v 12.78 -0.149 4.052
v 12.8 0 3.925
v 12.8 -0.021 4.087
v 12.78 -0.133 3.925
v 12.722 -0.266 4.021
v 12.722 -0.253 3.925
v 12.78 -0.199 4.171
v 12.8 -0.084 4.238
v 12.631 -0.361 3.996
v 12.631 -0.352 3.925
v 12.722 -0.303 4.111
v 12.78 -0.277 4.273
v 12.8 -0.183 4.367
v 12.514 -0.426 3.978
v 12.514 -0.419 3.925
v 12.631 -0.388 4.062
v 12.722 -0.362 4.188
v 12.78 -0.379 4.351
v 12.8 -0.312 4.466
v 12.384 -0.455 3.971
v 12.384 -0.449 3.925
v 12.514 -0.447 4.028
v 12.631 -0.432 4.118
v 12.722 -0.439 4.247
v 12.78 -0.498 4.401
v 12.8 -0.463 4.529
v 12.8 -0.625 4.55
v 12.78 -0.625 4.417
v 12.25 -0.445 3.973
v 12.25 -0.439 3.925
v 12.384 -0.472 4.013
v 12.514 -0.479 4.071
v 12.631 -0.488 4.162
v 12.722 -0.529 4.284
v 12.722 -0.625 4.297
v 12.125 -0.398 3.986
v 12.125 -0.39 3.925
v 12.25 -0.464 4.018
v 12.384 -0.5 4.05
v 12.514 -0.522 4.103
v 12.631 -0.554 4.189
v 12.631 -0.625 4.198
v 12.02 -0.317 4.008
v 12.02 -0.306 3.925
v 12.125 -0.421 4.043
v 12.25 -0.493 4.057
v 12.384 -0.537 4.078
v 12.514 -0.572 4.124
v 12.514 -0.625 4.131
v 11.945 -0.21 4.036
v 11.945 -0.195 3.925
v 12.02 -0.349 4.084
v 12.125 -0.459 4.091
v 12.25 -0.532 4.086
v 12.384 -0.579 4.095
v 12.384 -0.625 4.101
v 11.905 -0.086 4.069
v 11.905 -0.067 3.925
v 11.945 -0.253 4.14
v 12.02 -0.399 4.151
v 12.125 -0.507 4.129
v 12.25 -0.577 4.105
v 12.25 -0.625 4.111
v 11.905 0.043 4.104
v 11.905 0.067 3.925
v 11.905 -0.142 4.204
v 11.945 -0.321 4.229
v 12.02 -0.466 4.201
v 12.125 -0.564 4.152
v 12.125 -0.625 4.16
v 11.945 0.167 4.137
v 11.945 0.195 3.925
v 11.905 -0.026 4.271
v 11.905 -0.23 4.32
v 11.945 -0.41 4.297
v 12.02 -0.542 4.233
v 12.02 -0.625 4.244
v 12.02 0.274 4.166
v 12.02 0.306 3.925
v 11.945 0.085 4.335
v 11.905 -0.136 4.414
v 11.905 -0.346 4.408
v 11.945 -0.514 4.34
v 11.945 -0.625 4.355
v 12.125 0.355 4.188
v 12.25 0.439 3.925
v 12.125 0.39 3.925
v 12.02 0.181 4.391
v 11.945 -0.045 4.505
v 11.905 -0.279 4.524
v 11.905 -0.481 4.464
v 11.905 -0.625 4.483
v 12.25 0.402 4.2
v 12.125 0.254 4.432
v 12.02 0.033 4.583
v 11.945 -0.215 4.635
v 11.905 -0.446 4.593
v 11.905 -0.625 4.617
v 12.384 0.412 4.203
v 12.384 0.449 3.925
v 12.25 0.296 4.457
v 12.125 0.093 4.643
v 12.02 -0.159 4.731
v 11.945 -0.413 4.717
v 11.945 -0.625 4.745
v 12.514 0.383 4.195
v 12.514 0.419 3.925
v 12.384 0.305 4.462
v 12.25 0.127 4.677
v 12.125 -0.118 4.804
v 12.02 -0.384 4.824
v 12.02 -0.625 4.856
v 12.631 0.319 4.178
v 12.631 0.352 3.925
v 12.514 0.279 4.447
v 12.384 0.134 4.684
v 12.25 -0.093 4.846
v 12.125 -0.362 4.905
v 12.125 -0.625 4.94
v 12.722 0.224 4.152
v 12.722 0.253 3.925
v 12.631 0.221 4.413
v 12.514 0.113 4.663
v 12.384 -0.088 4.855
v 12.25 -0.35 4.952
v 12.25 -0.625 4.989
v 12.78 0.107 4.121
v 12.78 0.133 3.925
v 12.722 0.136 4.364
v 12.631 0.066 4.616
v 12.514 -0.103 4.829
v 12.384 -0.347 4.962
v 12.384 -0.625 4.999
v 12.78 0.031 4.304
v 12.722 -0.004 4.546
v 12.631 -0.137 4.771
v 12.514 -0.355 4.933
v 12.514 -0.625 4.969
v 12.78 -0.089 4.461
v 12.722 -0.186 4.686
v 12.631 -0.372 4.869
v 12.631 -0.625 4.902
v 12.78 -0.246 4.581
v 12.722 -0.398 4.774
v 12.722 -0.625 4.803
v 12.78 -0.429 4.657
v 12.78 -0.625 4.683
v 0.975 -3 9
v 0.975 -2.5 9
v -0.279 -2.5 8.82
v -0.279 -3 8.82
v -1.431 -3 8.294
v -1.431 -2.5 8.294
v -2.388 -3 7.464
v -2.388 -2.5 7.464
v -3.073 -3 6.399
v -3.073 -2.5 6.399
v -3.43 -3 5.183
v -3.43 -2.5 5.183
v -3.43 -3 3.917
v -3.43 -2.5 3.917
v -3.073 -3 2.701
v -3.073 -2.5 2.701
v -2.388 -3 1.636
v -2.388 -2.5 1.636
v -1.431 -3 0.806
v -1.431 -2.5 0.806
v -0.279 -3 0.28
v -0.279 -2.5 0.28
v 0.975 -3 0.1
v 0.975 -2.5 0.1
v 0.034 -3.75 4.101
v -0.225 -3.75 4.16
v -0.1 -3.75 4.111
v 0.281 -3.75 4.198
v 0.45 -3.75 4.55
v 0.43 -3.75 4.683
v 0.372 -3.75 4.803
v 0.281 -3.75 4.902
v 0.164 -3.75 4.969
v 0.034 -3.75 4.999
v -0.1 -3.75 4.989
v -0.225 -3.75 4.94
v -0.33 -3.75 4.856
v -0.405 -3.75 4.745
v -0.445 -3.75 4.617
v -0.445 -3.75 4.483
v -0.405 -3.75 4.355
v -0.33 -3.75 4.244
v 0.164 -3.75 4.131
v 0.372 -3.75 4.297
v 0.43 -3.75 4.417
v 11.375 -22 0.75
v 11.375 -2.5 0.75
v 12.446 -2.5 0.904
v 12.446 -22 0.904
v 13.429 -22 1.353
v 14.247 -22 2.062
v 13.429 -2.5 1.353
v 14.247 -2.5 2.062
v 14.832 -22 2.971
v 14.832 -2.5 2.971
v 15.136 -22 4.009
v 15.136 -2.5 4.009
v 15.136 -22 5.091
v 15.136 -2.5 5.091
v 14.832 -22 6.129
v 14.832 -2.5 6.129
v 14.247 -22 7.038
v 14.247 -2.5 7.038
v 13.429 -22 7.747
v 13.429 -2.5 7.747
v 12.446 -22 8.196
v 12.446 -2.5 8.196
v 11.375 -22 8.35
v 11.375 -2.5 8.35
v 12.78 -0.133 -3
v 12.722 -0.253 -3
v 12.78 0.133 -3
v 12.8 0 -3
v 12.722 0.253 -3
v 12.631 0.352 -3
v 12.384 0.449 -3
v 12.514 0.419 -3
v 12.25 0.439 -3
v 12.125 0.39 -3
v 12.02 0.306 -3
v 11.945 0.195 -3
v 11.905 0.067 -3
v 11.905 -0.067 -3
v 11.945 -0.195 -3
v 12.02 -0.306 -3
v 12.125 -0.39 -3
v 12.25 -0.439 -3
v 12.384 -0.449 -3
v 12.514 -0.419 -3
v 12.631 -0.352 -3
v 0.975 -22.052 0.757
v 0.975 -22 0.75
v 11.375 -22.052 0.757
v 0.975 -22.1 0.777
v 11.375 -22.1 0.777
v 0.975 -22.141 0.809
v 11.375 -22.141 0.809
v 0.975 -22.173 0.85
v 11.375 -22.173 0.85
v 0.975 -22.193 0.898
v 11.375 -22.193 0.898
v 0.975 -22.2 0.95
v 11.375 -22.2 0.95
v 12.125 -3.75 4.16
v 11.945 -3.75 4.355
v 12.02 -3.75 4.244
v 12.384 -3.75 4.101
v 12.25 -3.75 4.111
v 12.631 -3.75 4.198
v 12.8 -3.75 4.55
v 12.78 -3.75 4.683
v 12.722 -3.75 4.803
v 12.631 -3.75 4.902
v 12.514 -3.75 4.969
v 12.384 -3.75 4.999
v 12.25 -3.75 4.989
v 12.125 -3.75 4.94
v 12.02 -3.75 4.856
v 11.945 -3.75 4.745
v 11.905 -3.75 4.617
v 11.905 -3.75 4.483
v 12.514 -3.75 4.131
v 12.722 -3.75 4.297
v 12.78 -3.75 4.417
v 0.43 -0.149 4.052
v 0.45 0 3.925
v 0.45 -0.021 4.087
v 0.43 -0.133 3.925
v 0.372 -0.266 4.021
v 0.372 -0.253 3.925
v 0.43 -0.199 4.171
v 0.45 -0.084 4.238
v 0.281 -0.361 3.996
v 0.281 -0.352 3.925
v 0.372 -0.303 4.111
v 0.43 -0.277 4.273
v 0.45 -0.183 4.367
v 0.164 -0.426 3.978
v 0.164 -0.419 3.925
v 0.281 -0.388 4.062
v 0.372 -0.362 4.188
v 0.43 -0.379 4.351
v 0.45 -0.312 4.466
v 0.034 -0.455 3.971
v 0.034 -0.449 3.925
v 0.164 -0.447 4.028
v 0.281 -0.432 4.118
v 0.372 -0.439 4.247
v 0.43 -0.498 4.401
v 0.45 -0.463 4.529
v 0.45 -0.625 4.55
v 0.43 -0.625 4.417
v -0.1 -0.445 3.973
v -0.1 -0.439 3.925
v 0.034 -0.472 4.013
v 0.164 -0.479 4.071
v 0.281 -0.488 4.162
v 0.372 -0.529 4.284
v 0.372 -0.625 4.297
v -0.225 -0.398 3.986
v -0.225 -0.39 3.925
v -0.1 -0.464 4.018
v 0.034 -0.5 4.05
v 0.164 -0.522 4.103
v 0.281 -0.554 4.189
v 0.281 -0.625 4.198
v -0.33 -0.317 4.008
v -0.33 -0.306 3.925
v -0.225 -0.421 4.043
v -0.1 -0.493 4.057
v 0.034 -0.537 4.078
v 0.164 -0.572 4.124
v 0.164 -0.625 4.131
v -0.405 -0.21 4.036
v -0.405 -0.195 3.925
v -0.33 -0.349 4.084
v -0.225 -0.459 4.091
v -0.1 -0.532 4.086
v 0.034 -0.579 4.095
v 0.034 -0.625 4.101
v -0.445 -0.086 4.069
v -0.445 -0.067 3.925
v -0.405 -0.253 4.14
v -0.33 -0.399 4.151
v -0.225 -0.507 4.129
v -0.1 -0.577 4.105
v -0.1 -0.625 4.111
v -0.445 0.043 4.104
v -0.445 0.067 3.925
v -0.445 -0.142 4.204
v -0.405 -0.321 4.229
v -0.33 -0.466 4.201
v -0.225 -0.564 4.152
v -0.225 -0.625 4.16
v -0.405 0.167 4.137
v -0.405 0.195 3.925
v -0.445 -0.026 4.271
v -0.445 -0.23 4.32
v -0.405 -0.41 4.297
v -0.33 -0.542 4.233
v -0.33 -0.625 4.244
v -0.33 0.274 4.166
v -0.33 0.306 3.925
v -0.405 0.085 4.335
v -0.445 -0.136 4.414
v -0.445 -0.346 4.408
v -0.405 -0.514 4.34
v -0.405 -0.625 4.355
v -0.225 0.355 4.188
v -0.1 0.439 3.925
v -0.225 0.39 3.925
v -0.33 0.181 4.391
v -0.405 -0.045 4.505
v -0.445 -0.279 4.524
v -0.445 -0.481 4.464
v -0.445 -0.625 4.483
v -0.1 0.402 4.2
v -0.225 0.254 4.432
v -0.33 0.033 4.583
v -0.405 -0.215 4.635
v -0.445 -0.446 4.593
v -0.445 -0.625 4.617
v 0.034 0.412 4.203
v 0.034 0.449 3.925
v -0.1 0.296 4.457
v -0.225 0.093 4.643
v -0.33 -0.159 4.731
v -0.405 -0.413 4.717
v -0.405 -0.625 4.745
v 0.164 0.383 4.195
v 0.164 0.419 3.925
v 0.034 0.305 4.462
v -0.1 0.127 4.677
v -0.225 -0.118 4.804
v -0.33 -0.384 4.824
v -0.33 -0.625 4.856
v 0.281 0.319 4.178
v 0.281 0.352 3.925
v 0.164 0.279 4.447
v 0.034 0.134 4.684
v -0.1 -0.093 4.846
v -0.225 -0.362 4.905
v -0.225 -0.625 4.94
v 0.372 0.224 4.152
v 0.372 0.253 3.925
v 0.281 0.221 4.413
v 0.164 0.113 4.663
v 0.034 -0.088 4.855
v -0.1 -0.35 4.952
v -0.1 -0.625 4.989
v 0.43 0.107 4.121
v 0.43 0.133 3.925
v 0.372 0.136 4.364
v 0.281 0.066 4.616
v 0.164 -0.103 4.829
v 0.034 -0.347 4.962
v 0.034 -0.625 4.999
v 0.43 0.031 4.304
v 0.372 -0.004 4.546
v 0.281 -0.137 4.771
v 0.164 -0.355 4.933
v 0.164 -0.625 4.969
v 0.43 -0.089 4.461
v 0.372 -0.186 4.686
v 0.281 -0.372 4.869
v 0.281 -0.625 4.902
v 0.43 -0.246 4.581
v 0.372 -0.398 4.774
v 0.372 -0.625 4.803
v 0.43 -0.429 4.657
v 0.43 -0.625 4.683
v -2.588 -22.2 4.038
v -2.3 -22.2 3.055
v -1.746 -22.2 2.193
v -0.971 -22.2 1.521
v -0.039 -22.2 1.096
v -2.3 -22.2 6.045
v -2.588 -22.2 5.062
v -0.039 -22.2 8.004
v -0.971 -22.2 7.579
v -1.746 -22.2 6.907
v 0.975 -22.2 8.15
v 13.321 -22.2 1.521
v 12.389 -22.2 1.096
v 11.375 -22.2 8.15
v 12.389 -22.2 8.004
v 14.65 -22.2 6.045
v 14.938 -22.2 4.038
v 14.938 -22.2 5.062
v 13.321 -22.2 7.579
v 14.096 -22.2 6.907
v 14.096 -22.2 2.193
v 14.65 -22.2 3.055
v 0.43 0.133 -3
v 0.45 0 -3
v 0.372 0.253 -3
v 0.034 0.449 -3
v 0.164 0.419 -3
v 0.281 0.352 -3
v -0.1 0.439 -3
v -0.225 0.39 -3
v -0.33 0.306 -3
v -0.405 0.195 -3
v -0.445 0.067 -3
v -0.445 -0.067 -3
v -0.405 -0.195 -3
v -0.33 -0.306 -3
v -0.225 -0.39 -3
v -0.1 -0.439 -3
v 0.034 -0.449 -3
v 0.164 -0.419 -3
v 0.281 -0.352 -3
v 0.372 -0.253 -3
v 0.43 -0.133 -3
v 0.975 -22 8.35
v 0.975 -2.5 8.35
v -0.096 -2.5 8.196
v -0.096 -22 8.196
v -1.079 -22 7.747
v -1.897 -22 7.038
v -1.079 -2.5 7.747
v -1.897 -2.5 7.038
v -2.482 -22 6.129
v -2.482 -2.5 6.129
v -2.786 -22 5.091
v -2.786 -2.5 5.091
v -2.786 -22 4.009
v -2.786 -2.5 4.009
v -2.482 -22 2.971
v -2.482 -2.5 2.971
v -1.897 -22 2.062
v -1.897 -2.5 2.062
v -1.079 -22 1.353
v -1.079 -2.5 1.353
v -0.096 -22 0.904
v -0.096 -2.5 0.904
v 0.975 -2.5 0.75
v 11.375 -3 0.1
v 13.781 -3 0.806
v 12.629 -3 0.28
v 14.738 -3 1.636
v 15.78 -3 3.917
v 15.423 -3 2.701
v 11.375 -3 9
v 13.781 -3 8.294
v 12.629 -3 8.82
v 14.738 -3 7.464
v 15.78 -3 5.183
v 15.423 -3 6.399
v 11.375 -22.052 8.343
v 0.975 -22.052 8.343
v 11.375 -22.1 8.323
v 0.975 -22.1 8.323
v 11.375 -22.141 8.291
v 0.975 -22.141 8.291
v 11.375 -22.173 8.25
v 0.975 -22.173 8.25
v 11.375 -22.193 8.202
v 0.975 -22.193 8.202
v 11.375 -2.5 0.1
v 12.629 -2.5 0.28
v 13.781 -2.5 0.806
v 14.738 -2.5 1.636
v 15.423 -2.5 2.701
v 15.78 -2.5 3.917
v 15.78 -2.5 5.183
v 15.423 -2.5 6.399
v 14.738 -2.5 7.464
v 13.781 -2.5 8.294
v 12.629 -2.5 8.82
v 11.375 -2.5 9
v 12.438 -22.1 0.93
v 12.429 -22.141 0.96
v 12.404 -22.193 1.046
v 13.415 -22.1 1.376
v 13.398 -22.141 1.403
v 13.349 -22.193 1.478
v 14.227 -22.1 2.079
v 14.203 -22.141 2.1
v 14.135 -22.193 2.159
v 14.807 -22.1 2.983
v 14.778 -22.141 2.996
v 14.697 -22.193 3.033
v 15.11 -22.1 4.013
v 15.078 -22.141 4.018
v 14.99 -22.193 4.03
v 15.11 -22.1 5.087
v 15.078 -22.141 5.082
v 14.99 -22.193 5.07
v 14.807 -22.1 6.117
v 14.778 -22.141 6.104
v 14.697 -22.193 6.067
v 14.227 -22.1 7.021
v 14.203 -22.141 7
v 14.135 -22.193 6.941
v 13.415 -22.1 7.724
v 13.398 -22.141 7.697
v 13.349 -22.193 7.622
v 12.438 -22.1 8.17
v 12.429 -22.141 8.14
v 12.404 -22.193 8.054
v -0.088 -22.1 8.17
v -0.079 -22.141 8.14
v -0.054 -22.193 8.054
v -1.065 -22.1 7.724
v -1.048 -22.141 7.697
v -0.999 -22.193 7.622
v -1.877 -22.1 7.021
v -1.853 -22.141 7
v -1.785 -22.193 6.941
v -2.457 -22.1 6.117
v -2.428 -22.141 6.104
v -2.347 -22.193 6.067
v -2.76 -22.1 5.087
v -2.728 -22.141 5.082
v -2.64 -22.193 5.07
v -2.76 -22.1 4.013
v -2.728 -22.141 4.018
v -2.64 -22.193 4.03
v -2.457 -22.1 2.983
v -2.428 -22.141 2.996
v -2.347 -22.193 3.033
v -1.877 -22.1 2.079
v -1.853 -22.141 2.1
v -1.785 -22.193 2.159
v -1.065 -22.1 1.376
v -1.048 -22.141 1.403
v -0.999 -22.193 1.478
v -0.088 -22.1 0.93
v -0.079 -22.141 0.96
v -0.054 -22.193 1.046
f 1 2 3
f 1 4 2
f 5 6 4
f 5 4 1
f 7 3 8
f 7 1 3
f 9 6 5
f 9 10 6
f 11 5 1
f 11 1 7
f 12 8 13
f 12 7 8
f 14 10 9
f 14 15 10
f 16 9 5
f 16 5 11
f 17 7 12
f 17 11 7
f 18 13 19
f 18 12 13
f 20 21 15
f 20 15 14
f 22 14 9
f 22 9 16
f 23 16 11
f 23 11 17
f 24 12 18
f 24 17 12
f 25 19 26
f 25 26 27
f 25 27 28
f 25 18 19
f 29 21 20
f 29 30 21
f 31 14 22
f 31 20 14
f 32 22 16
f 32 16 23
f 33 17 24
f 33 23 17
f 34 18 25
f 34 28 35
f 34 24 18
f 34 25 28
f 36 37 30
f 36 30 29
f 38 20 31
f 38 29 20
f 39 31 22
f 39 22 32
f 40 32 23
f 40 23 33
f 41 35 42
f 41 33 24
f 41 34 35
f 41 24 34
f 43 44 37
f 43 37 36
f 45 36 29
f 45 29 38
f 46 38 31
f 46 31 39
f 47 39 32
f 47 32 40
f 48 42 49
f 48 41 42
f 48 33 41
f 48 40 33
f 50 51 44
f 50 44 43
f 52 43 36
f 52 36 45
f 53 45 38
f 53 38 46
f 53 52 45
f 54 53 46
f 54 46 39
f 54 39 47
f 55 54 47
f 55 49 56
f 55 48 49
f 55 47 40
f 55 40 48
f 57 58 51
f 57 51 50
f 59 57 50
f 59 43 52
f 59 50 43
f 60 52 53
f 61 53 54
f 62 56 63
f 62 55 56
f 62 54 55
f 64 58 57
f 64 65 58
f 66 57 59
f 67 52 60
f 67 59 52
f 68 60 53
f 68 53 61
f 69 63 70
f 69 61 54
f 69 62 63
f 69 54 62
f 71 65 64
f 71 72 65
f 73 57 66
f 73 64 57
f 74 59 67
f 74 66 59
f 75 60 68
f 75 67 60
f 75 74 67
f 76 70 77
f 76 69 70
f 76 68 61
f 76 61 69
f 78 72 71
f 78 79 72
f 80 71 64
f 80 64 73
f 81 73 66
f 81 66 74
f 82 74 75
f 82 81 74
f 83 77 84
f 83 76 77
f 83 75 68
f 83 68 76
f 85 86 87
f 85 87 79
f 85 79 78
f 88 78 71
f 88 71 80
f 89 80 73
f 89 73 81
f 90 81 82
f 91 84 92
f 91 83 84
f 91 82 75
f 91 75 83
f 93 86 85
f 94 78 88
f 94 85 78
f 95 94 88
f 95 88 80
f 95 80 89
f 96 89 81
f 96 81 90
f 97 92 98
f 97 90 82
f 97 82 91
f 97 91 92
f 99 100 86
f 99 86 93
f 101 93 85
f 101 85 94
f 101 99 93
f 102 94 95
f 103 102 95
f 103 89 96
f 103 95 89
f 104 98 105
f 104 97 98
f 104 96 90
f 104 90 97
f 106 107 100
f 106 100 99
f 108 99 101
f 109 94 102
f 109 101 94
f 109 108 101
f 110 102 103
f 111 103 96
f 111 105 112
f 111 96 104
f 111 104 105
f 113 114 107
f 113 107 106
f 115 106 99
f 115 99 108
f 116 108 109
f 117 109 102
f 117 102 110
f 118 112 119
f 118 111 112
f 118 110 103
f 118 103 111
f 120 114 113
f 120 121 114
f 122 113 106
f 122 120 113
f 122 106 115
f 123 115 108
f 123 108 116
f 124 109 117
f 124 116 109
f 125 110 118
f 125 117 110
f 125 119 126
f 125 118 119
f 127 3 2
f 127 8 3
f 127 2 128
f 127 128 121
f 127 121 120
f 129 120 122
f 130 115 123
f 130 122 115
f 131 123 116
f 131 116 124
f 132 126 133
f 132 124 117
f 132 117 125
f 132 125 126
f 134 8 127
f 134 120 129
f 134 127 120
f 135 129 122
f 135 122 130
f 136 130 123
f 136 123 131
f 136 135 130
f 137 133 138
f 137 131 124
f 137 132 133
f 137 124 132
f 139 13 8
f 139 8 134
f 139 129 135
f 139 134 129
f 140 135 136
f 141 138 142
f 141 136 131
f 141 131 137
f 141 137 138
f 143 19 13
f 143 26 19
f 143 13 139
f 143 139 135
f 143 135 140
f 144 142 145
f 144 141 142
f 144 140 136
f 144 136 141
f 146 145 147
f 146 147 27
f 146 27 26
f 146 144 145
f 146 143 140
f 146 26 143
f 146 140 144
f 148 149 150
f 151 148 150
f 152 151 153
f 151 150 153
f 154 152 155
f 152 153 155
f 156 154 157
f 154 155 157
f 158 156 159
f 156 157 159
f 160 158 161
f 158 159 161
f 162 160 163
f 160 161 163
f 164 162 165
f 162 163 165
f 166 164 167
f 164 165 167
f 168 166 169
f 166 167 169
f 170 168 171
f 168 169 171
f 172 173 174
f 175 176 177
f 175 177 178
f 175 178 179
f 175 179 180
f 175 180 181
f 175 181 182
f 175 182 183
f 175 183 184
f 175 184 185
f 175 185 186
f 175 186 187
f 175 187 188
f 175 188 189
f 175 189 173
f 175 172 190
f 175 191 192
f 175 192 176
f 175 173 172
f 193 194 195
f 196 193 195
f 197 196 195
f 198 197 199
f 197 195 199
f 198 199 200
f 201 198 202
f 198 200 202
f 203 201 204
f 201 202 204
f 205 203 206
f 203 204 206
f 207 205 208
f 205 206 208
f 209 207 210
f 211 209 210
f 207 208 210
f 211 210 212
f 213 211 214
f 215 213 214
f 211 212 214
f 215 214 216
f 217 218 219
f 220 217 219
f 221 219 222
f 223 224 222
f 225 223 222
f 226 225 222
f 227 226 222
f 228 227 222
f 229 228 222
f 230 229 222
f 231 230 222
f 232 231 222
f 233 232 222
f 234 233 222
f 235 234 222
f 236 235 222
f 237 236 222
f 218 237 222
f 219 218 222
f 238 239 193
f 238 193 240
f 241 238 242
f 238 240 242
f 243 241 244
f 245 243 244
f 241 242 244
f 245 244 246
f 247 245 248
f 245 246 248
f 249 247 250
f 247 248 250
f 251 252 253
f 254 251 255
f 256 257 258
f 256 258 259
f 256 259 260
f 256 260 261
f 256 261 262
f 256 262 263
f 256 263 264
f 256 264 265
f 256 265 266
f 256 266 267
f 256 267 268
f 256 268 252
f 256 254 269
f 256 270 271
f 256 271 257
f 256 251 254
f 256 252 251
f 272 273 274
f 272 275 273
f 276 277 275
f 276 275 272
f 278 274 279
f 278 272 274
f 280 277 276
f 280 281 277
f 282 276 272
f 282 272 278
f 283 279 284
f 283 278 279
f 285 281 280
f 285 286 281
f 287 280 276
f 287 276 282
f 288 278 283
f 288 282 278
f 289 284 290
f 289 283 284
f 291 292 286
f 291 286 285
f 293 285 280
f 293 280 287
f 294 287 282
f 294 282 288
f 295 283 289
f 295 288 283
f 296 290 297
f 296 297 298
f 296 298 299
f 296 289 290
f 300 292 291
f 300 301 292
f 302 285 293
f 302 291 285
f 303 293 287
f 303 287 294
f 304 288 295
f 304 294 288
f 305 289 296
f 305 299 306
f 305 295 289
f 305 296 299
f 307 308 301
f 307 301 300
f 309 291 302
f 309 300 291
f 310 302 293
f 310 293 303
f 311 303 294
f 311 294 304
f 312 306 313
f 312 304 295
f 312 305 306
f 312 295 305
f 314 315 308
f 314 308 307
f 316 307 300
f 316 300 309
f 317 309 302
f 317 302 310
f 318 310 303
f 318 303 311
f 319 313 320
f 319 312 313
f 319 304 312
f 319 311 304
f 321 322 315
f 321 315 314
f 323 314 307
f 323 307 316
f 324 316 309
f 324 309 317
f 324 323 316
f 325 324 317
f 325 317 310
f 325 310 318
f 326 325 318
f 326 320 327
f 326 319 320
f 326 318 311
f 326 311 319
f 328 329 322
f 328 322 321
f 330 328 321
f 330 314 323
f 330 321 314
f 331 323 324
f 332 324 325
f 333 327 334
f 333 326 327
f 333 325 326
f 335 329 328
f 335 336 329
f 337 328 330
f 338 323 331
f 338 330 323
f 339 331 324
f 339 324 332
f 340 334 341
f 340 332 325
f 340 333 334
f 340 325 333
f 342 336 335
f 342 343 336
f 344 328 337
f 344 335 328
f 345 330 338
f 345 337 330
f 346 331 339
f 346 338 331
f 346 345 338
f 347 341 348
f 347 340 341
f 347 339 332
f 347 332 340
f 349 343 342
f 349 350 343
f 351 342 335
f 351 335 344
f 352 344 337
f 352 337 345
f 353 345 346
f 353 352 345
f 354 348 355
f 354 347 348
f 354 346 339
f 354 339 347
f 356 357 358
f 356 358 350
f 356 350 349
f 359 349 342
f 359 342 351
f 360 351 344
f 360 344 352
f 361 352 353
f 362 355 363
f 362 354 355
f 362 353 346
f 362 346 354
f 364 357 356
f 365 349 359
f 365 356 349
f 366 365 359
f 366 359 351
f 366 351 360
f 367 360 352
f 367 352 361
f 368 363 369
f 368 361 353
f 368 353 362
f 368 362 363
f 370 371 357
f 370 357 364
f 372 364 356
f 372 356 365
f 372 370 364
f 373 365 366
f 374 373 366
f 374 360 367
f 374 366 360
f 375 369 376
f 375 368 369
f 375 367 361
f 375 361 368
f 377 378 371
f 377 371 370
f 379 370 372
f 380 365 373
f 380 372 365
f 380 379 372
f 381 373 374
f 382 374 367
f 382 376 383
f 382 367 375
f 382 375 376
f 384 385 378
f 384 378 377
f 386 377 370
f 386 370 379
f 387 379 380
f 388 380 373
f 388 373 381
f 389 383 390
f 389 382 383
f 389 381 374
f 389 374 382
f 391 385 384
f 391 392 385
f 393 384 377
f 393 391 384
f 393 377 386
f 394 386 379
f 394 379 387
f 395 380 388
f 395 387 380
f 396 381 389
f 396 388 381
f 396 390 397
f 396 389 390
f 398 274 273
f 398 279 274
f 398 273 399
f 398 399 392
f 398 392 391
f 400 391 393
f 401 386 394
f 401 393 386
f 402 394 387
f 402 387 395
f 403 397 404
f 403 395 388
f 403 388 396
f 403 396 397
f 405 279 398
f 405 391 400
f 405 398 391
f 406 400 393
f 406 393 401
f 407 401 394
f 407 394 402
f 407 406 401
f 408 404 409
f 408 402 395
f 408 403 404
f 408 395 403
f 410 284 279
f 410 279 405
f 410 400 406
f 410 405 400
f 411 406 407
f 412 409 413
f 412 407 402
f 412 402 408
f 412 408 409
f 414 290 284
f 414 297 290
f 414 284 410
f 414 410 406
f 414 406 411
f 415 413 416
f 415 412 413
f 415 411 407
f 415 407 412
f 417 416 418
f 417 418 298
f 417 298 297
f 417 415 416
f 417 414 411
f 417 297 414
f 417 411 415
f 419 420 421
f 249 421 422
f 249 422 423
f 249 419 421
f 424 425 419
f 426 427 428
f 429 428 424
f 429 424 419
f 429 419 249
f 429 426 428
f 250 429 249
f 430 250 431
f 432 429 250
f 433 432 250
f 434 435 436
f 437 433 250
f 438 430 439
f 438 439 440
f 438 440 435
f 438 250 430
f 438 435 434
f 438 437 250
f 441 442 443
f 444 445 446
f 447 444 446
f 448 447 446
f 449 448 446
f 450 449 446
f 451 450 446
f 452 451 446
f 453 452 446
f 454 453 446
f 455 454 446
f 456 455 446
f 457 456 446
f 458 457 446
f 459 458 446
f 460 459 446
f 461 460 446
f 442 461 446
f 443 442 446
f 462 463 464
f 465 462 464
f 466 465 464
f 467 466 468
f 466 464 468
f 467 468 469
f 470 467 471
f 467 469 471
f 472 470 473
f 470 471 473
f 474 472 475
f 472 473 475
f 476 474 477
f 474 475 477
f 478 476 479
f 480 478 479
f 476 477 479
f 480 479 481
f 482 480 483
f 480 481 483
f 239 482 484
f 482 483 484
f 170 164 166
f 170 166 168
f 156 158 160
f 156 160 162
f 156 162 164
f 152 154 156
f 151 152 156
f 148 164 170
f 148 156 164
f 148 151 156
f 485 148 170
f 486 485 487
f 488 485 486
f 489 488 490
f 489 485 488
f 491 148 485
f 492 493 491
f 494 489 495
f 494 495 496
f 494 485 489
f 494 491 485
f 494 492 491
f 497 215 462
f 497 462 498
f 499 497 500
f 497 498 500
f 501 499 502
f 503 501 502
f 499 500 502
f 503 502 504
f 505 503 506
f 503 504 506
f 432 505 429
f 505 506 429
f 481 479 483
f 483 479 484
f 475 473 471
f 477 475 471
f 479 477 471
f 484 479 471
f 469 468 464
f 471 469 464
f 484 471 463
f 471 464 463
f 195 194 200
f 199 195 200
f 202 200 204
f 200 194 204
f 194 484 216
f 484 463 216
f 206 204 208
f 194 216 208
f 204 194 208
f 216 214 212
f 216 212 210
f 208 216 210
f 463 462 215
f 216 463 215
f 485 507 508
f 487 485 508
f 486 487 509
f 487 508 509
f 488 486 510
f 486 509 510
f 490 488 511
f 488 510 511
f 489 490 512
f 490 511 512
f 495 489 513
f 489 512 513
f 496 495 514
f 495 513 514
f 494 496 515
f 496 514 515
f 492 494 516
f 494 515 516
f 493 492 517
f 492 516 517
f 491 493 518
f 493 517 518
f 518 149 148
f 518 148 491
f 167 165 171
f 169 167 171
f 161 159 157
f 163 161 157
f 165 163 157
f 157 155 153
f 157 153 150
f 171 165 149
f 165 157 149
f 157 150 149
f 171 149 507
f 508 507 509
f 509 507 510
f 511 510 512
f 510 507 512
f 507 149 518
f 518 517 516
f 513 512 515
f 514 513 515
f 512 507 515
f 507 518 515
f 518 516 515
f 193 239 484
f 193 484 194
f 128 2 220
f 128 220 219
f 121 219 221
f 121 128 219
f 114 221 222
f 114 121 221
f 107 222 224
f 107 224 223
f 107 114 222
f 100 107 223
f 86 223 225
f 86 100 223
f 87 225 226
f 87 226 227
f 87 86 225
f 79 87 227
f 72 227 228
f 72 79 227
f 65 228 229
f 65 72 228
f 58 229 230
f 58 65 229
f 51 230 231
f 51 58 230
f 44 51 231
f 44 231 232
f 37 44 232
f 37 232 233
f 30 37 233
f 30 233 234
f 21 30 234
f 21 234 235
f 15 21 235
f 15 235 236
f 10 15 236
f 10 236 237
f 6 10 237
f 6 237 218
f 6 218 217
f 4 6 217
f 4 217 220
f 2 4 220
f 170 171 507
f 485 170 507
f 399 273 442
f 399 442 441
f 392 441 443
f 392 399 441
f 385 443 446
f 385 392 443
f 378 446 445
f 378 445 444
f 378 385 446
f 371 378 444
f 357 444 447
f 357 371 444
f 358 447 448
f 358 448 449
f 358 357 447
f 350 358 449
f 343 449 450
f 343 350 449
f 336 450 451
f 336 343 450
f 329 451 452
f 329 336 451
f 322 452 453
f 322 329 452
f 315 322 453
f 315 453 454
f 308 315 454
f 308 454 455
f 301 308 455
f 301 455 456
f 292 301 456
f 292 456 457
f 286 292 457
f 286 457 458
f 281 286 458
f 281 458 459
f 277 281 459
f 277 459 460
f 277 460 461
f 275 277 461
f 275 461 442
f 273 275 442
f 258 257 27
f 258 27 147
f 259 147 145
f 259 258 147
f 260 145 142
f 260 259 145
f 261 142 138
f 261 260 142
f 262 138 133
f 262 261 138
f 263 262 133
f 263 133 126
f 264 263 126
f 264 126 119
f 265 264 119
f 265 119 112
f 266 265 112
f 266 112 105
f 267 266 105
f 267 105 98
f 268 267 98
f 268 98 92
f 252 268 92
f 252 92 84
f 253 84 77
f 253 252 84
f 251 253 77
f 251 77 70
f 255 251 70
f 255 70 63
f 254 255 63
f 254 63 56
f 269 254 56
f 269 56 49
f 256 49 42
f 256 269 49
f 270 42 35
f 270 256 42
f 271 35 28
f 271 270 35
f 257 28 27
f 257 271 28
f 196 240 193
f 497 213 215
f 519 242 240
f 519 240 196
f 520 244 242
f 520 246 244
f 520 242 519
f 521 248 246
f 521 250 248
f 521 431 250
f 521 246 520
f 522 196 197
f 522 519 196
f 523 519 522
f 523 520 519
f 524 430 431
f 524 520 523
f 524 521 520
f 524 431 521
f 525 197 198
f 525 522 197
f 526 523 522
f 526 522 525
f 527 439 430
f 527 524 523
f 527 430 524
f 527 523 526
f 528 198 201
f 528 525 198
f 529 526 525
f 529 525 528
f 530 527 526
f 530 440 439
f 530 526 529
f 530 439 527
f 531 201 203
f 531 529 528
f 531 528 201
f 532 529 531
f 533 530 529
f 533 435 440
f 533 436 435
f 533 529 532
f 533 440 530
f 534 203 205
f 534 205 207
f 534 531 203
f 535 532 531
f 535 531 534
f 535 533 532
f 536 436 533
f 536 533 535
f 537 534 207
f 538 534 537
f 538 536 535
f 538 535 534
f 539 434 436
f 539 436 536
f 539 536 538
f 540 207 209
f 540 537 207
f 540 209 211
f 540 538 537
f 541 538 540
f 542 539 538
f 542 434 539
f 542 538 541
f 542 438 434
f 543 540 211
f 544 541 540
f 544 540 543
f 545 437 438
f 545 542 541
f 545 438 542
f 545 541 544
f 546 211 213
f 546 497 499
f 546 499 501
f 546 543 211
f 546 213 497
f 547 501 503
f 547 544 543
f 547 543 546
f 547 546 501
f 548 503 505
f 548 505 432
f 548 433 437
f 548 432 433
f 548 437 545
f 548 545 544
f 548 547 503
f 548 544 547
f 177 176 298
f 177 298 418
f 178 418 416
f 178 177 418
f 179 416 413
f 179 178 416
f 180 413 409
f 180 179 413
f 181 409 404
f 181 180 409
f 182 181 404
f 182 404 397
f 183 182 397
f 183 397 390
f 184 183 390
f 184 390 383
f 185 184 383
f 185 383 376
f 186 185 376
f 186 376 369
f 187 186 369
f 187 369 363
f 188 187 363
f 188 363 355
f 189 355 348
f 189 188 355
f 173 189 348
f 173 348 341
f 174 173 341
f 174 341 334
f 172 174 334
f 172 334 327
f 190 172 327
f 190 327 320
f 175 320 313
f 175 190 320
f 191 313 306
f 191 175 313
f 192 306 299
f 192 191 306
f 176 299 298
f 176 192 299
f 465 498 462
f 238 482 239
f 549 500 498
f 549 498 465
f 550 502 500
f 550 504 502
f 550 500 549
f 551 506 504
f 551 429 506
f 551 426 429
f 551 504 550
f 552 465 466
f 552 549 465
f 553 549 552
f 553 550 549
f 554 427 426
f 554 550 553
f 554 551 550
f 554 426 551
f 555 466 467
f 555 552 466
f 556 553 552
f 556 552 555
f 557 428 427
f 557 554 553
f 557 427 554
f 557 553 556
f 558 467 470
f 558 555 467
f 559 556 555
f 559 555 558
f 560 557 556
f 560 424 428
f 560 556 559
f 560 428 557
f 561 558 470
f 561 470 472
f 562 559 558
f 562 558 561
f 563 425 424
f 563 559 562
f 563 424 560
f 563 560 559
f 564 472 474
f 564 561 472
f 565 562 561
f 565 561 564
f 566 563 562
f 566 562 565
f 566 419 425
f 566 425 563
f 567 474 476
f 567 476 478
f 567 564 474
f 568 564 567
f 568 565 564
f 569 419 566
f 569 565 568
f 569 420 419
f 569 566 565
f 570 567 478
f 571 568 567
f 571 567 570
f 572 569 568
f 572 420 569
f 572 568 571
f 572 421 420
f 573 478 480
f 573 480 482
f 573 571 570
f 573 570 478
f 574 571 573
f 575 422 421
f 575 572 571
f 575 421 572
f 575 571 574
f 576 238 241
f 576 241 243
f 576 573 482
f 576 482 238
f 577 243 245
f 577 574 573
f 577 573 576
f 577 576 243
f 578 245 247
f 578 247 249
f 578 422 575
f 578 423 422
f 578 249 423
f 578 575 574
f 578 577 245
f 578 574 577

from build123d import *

# Parameters (mm, degrees)
PAD_DEPTH    = 0.5
PAD001_DEPTH = 19.7
FILLET_R     = 0.2
SKETCH_R     = 0.45
SKETCH002_R  = 0.45


with BuildPart() as pad:
    # Sketch004 → Pad (new body)
    with BuildSketch(Plane.XZ.offset(2.5)):
        with BuildLine():
            ThreePointArc((0.975, 9), (-3.475, 4.55), (0.975, 0.1))
            Line((0.975, 0.1), (11.375, 0.1))
            ThreePointArc((11.375, 0.1), (15.825, 4.55), (11.375, 9))
            Line((0.975, 9), (11.375, 9))
        make_face()
    extrude(amount=PAD_DEPTH)


with BuildPart() as fillet_body:
    # Sketch005 → Pad001 (new body)
    with BuildSketch(Plane.XZ.offset(2.5)):
        with BuildLine():
            ThreePointArc((0.975, 8.35), (-2.825, 4.55), (0.975, 0.75))
            Line((0.975, 0.75), (11.375, 0.75))
            ThreePointArc((11.375, 0.75), (15.175, 4.55), (11.375, 8.35))
            Line((0.975, 8.35), (11.375, 8.35))
        make_face()
    extrude(amount=PAD001_DEPTH)

    # Fillet
    fillet_edges = [fillet_body.edges().sort_by_distance(p)[0] for p in [
        (6.175, -22.2, 0.75),
        (-2.825, -22.2, 4.55),
        (6.175, -22.2, 8.35),
        (15.175, -22.2, 4.55),
    ]]
    fillet(fillet_edges, radius=FILLET_R)


with BuildPart() as sweep_body:
    # Sweep: sweep along a path in Sketch001
    with BuildLine(Plane.YZ) as sweep_path:
        Line((0, -3), (0, 3.925))
        ThreePointArc((0, 3.925), (-0.183058, 4.366942), (-0.625, 4.55))
        Line((-0.625, 4.55), (-3.75, 4.55))
    # Sketch → Sweep (sweep)
    with BuildSketch(Plane.XY.offset(0.1)):
        Circle(SKETCH_R)
    sweep(path=sweep_path.line)


with BuildPart() as sweep001:
    # Sweep001: sweep along a path in Sketch001
    with BuildLine(Plane.YZ) as sweep001_path:
        Line((0, -3), (0, 3.925))
        ThreePointArc((0, 3.925), (-0.183058, 4.366942), (-0.625, 4.55))
        Line((-0.625, 4.55), (-3.75, 4.55))
    # Sketch002 → Sweep001 (sweep)
    with BuildSketch(Plane.XY.offset(0.1)):
        with Locations((12.35, 0)):
            Circle(SKETCH002_R)
    sweep(path=sweep001_path.line)


solid = Compound([pad.part, fillet_body.part, sweep_body.part, sweep001.part])
